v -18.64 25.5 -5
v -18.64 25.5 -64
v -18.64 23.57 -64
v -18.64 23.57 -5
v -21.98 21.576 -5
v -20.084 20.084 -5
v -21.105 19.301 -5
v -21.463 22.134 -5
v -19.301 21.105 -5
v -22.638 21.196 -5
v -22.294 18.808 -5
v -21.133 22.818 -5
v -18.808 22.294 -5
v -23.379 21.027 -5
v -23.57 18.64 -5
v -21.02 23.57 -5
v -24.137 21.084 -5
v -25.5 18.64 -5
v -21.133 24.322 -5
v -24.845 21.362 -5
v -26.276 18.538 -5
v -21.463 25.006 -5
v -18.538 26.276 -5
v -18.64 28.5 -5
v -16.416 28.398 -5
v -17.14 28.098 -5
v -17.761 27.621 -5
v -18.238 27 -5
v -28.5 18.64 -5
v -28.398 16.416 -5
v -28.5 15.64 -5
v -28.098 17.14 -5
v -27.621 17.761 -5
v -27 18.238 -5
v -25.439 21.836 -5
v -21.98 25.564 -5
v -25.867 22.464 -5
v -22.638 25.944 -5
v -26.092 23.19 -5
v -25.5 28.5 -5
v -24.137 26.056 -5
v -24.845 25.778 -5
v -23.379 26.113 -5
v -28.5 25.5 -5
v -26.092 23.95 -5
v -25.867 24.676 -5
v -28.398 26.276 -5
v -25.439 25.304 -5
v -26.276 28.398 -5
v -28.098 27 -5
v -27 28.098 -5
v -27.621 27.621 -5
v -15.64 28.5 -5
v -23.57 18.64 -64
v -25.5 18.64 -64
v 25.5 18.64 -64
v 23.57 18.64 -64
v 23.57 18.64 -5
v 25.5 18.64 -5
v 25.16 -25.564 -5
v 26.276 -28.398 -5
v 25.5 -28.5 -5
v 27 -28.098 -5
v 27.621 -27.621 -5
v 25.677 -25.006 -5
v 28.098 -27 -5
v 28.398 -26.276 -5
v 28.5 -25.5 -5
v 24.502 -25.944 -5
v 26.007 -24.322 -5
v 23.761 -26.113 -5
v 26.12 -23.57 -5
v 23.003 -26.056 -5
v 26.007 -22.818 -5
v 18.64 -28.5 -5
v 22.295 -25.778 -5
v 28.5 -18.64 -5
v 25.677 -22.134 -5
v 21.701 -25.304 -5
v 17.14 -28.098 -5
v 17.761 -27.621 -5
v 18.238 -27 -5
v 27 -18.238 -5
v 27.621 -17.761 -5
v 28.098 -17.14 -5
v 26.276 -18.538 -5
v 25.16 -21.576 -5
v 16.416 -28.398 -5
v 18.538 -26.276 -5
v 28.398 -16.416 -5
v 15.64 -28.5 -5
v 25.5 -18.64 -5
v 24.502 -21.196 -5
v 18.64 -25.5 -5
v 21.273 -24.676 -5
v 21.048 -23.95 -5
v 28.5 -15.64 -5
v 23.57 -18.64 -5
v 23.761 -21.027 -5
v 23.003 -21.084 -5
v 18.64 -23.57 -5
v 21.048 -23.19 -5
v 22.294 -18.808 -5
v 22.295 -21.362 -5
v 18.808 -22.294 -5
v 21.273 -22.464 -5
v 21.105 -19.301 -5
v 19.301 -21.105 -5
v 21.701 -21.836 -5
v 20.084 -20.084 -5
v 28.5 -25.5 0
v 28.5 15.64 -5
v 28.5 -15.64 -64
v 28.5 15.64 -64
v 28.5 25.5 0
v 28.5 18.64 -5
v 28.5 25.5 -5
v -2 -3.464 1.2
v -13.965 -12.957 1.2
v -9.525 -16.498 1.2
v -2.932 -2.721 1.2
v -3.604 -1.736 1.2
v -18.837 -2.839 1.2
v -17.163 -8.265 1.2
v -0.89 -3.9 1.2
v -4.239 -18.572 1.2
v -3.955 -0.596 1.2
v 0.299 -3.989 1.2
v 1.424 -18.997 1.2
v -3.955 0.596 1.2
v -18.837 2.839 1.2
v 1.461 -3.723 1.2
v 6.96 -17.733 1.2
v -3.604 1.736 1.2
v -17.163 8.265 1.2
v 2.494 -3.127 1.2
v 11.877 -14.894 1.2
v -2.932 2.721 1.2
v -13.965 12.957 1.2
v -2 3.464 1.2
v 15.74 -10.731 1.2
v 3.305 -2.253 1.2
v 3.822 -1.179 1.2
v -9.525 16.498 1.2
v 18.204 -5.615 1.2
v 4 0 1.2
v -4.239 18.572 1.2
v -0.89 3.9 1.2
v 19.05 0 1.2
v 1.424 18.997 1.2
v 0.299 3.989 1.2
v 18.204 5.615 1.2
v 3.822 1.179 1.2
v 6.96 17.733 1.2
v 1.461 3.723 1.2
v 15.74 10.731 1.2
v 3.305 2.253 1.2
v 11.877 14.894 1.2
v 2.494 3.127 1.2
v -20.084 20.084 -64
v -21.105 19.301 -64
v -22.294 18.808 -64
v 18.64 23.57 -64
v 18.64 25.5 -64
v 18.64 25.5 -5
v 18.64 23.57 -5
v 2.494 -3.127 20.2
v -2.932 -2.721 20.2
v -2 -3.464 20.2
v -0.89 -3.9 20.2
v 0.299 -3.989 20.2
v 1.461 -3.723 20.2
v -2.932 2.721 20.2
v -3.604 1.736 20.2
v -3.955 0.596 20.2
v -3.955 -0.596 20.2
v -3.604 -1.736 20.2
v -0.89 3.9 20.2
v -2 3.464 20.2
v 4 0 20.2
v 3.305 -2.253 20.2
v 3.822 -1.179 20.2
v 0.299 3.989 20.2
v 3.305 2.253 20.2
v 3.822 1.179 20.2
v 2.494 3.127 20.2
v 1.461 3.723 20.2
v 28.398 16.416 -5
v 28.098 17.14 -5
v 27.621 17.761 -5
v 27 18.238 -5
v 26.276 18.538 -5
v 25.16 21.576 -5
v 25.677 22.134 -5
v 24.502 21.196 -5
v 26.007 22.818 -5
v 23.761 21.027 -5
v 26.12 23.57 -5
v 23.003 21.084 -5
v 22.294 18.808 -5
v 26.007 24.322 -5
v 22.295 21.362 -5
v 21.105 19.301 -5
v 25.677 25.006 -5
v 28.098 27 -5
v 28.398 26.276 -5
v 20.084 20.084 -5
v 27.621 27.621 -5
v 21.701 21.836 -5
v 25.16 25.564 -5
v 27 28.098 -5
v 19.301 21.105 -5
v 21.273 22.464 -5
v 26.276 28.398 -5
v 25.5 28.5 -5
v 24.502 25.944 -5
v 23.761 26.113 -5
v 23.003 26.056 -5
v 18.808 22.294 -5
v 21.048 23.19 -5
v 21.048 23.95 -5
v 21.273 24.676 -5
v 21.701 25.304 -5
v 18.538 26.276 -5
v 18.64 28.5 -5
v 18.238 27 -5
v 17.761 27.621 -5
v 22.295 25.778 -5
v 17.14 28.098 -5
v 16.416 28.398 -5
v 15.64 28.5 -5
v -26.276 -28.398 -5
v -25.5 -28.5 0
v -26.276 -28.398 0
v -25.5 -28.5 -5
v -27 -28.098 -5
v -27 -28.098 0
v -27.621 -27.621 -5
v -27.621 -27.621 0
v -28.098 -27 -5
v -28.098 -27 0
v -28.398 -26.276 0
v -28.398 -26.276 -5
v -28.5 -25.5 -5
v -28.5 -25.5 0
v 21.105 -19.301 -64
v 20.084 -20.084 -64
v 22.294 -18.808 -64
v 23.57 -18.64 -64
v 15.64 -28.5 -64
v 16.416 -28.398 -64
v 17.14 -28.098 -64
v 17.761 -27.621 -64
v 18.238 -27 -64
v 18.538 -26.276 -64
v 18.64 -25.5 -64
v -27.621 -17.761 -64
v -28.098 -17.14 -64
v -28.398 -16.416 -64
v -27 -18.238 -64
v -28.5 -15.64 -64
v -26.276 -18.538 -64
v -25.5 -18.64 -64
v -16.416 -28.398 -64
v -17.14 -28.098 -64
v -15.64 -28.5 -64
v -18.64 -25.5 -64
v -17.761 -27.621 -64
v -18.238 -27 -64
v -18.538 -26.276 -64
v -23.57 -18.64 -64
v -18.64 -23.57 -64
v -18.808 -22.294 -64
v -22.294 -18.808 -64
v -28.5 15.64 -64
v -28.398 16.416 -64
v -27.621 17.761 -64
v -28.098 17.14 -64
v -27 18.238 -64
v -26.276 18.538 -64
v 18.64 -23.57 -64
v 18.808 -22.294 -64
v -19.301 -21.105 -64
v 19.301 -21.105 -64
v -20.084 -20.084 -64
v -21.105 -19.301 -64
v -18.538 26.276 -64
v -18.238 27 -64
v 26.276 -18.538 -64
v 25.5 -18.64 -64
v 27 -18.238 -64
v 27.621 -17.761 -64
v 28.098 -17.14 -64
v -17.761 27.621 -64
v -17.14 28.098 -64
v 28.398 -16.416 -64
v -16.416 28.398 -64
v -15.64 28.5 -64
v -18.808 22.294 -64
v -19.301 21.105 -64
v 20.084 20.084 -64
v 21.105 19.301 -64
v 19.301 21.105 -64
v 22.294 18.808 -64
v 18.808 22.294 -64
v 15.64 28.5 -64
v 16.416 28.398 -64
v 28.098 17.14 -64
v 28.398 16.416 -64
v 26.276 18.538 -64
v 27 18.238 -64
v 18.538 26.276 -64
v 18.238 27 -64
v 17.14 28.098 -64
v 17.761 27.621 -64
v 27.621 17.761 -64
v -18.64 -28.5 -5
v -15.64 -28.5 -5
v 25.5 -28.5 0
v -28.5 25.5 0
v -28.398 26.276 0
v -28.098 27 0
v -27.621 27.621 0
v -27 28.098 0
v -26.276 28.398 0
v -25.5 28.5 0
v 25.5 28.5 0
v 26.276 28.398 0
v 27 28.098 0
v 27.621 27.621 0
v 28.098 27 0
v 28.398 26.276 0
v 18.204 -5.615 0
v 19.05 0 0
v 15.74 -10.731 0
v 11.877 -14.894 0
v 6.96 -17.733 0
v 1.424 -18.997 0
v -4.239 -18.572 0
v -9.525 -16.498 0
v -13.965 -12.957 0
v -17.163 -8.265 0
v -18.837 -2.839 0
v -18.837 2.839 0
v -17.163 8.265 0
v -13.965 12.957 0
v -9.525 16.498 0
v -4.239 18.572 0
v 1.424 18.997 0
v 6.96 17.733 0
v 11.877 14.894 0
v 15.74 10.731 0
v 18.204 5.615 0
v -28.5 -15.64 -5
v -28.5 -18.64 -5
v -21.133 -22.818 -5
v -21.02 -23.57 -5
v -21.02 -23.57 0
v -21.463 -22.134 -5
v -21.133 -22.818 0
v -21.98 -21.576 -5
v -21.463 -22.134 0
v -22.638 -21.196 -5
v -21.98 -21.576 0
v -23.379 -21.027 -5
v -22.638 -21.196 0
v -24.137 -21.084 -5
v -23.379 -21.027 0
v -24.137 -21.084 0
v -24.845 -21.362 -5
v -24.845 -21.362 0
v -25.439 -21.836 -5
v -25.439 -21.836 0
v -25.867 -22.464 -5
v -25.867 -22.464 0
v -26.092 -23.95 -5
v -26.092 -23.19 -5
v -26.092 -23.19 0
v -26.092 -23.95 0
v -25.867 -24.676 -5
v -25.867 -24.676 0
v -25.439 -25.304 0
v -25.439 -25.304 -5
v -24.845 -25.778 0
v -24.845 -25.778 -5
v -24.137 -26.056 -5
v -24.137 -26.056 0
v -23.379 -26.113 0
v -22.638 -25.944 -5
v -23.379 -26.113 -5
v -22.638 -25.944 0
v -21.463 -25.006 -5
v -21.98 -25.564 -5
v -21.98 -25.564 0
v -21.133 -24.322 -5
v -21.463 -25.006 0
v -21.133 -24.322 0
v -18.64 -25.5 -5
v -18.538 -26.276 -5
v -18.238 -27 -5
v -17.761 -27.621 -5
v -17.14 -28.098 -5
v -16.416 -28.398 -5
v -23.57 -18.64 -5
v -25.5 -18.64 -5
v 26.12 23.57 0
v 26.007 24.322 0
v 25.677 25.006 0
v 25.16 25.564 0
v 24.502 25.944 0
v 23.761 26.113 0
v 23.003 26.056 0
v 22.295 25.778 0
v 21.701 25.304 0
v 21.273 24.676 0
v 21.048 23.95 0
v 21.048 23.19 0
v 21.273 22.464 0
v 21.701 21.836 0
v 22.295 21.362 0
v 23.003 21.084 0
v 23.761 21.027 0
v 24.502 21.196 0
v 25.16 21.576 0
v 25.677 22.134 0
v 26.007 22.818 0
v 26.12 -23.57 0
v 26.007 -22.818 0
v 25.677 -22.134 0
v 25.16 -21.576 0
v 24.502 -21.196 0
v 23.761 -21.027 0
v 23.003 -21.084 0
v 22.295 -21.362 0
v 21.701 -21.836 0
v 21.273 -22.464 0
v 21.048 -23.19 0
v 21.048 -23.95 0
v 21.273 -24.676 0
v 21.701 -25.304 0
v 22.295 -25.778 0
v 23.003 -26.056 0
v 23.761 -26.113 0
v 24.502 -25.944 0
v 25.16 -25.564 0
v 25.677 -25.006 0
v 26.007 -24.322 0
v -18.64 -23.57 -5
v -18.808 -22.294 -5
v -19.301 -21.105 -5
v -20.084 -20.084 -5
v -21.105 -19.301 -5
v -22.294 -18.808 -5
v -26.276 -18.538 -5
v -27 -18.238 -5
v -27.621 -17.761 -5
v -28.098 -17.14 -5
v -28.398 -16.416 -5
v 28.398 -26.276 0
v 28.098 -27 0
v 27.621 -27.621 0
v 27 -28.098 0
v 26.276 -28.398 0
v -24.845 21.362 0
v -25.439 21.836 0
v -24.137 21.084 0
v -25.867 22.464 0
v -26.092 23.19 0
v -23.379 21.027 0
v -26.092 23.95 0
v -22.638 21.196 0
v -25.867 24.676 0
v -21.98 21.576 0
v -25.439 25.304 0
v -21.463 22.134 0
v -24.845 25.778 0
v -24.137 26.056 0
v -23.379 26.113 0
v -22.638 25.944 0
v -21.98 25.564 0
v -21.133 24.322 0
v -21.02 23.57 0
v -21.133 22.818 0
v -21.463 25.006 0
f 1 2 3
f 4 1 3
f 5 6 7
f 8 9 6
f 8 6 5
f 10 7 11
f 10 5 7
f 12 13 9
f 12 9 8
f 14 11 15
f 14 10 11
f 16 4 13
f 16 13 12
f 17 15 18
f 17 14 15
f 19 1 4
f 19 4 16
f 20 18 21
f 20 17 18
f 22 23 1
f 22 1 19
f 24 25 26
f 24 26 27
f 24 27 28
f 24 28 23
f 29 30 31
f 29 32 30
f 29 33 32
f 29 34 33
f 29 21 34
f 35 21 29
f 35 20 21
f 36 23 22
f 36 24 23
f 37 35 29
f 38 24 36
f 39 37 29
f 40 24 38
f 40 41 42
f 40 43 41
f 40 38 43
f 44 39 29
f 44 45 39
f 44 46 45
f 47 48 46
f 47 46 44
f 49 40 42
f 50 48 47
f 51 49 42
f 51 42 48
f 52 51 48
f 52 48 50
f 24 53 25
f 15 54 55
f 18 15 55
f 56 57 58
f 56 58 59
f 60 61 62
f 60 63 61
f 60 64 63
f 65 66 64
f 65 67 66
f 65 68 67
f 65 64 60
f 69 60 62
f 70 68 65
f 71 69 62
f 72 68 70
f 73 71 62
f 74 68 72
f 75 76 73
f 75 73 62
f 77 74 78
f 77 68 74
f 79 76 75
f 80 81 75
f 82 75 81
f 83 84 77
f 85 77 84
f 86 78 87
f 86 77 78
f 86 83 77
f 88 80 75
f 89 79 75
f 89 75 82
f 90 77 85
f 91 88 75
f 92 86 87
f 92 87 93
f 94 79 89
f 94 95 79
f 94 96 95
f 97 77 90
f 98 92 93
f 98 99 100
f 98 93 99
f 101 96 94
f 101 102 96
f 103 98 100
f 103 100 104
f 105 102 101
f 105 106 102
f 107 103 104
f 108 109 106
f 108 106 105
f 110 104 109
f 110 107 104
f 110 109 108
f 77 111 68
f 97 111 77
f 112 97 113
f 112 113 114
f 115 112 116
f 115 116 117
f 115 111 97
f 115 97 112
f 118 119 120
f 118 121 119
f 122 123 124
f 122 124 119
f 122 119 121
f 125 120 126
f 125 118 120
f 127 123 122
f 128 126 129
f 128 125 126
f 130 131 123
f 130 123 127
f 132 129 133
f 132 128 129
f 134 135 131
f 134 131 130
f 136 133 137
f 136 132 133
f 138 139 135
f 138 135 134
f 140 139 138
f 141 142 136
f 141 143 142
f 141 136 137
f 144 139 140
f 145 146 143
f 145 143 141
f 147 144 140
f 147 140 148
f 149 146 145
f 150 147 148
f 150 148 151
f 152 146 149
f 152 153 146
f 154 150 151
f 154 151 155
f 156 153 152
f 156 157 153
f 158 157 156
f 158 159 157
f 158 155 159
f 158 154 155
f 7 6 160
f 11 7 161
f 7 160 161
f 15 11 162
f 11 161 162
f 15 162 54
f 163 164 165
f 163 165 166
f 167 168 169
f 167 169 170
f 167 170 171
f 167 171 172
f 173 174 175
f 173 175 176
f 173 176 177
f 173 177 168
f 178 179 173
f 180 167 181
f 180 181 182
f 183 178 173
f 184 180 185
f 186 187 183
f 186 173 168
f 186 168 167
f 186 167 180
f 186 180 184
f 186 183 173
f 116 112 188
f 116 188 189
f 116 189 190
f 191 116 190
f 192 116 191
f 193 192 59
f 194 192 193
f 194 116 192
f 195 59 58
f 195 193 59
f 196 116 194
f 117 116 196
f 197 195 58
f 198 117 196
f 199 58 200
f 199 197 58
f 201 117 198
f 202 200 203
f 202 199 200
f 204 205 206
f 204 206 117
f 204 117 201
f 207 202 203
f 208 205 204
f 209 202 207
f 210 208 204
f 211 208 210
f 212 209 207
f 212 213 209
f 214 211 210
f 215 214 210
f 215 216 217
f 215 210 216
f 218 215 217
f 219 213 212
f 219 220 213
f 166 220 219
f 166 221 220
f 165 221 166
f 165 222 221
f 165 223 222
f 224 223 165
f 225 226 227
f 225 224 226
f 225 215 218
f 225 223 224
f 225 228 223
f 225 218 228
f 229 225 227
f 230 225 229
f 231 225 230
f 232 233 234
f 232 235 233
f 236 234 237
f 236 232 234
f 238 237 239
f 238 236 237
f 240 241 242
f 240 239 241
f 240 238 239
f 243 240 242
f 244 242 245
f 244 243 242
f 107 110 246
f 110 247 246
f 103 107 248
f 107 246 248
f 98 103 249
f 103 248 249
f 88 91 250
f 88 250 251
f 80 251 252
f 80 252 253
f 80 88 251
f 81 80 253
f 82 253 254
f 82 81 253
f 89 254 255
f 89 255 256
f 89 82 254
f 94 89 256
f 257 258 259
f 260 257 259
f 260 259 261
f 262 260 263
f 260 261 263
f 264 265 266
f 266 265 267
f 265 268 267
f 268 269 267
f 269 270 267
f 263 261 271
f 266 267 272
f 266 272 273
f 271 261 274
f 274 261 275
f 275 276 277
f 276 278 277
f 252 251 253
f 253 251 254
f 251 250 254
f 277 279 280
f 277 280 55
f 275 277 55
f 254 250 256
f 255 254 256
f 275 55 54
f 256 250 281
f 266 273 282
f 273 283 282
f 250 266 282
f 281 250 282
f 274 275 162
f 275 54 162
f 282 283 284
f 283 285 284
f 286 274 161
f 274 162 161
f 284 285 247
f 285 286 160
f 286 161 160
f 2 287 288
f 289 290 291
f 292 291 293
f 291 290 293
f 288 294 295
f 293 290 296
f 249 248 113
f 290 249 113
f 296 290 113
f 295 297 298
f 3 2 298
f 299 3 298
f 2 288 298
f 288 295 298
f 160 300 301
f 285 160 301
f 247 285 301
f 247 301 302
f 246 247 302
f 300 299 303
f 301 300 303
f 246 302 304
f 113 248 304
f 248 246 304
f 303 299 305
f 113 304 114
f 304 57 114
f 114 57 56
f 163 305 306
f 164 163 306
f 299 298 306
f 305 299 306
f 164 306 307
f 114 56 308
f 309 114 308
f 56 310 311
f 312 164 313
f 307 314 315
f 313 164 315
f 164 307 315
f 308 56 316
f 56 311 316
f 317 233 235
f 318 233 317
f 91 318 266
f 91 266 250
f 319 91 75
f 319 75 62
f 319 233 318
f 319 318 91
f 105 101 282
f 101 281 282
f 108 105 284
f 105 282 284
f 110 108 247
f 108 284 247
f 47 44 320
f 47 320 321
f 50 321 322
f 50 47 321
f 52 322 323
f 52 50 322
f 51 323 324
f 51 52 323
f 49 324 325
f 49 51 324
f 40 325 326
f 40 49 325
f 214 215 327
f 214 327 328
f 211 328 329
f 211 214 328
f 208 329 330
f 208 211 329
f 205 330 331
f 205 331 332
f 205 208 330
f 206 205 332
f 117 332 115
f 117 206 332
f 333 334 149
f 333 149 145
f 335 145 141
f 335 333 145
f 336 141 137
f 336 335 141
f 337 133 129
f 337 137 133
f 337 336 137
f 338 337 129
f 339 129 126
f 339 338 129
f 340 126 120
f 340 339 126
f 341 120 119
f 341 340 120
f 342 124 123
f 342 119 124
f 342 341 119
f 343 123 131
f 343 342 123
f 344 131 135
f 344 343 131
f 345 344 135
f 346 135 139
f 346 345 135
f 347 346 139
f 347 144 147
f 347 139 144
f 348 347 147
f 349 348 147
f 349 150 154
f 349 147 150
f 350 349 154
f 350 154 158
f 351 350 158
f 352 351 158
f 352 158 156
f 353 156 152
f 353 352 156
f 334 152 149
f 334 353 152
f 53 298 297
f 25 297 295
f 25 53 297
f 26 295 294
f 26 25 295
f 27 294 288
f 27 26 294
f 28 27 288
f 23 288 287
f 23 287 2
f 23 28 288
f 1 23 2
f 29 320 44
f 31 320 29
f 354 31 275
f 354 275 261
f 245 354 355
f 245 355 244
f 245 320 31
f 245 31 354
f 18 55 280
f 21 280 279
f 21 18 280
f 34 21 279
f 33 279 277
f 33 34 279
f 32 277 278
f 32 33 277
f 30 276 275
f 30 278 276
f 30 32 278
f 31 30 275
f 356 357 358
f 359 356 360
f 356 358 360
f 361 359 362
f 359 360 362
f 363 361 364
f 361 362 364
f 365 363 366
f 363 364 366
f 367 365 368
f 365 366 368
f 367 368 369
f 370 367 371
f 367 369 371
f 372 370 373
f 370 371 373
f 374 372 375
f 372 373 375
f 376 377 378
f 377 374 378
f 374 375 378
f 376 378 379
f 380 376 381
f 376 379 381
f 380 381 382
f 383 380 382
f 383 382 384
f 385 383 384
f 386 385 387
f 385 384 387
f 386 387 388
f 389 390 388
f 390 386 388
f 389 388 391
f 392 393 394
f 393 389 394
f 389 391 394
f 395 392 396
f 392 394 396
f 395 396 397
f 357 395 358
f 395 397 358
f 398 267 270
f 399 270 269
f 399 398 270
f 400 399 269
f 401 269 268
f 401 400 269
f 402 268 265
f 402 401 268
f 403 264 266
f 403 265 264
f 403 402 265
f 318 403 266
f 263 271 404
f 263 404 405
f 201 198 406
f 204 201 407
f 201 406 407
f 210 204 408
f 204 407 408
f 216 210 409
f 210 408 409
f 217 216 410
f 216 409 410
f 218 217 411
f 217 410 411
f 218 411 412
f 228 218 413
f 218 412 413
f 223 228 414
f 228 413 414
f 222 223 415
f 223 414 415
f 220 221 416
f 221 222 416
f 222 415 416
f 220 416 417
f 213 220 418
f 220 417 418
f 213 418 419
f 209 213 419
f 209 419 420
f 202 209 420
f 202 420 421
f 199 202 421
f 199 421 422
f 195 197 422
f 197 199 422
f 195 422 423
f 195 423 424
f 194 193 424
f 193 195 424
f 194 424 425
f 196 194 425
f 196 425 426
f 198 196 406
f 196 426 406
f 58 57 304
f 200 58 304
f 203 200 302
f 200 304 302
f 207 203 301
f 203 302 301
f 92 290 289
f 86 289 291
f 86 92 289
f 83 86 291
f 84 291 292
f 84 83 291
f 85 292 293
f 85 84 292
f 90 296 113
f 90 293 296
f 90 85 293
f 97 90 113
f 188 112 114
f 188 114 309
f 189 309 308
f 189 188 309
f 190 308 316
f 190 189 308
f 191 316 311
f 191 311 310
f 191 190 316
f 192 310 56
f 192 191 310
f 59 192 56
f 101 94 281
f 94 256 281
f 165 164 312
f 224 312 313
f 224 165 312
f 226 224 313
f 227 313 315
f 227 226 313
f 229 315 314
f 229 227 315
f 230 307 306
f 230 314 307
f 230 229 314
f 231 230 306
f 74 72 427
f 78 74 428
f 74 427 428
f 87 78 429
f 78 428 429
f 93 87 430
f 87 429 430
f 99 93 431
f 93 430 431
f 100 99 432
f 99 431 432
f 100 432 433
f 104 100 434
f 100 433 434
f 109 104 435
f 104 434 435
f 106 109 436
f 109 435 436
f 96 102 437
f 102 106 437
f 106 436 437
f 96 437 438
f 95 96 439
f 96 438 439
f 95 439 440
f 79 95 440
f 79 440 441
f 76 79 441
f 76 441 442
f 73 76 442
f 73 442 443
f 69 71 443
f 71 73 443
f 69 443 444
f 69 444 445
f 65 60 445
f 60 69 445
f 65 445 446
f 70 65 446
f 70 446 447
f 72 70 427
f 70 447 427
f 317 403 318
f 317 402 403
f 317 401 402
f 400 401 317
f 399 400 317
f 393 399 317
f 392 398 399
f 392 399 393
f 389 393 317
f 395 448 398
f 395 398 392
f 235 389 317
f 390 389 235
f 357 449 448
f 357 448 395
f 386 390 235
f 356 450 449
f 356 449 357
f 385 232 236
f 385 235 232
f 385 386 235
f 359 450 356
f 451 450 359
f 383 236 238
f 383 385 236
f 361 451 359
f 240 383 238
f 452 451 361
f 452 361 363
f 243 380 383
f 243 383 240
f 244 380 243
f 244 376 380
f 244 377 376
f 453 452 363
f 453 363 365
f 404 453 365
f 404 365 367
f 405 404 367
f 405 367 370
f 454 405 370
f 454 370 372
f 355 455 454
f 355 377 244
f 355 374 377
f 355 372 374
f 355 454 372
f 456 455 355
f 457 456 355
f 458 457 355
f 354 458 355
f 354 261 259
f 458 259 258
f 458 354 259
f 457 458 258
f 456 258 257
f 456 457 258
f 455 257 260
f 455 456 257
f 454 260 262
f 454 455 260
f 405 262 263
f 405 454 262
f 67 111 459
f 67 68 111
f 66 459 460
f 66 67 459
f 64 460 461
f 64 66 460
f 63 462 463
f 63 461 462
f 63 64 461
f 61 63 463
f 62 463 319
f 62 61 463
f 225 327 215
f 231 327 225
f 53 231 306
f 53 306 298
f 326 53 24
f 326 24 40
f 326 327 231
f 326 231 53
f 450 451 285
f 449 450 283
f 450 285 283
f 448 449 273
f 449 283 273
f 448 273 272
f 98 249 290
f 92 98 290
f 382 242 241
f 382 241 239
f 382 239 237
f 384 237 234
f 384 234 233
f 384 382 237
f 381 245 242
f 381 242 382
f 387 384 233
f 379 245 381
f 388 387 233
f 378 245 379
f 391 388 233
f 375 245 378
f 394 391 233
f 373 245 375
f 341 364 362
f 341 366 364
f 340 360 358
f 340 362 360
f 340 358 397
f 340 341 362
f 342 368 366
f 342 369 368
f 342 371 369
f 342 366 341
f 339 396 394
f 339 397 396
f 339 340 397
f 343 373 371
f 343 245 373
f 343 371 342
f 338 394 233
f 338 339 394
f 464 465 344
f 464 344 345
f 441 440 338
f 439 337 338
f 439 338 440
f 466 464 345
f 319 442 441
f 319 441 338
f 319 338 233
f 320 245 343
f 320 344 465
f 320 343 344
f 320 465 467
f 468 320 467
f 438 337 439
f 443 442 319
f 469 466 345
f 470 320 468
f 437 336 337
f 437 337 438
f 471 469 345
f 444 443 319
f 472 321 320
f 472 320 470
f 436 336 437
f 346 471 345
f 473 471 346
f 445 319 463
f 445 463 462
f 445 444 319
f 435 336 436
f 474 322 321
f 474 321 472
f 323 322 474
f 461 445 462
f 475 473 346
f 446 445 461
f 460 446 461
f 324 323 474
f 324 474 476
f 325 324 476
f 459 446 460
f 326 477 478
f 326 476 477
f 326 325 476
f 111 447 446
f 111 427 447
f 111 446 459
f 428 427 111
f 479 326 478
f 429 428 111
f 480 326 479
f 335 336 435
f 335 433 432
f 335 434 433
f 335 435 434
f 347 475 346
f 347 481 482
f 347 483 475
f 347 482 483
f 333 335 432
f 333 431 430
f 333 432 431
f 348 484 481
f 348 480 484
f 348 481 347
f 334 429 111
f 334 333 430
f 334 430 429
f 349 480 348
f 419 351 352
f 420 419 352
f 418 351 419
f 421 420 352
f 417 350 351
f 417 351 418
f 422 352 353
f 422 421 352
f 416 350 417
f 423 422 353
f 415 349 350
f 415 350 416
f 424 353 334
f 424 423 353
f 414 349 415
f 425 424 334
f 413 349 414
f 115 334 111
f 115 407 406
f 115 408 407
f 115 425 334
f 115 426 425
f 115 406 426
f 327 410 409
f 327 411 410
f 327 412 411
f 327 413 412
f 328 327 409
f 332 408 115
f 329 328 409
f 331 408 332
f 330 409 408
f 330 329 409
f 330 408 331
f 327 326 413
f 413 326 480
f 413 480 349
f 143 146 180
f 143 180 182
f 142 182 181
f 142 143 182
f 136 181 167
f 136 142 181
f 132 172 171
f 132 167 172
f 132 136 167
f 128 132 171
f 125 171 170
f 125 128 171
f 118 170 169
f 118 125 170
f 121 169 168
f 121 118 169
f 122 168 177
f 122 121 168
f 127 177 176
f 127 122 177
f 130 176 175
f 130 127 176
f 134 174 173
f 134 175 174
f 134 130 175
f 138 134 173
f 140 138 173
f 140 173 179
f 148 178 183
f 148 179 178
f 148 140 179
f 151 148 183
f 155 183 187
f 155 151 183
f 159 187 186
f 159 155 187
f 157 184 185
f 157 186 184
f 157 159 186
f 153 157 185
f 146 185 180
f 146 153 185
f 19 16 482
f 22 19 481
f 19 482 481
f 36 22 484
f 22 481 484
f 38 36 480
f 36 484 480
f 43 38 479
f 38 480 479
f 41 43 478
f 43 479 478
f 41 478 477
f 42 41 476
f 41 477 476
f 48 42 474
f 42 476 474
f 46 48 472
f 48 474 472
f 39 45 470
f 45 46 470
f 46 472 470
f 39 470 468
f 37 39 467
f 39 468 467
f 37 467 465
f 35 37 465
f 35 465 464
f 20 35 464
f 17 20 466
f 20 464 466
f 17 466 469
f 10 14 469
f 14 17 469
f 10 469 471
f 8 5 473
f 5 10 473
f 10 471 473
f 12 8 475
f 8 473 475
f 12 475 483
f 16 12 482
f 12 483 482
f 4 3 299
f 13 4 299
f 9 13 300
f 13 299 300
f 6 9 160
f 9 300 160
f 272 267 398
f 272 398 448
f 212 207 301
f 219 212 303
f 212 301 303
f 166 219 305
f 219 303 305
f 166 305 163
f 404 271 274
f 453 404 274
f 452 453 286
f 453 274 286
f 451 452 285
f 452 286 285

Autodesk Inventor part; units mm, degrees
ref_plane "YZ Plane" through (0, 0, 0) normal (1, 0, 0) x (0, 1, 0)
ref_plane "XZ Plane" through (0, 0, 0) normal (0, 1, 0) x (-1, 0, 0)
ref_plane "XY Plane" through (0, 0, 0) normal (0, 0, 1) x (1, 0, 0)
sketch "Sketch1" plane through (0, 0, 0) normal (0, 0, 1) x (1, 0, 0)
  line L0 (-28.5, -28.5) -> (28.5, -28.5)
  line L1 (28.5, -28.5) -> (28.5, 28.5)
  line L2 (28.5, 28.5) -> (-28.5, 28.5)
  line L3 (-28.5, 28.5) -> (-28.5, -28.5)
  line L4 (-28.5, -28.5) -> (28.5, 28.5) construction
  line L5 (28.5, -28.5) -> (-28.5, 28.5) construction
  circle A0 centre (23.57, 23.57) radius 2.55
  line L6 (0, 28.5) -> (0, -28.5) construction
  line L7 (28.5, 0) -> (-28.5, 0) construction
  circle A1 centre (-23.57, 23.57) radius 2.55
  circle A2 centre (23.57, -23.57) radius 2.55
  circle A3 centre (-23.57, -23.57) radius 2.55
  circle A4 centre (0, 0) radius 19.05
  circle A5 centre (0, 0) radius 4
  dimension "d0" = 57
  dimension "d1" = 57
  dimension "d2" = 5.1
  dimension "d3" = 47.14
  dimension "d4" = 38.1
  dimension "d5" = 8
extrude "Extrusion1" add sketch "Sketch1" against normal blind 64 contours L3 L2 L1 L0 | A4 | A5
extrude "Extrusion2" add sketch "Sketch1" along normal blind 1.2 contours A4
extrude "Extrusion3" add sketch "Sketch1" along normal blind 20.2 contours A5
sketch "Sketch2" plane through (0, 0, -64) normal (0, 0, -1) x (-1, 0, 0)
  circle A0 centre (-23.57, -23.57) radius 2.55 projected
  circle A1 centre (23.57, -23.57) radius 2.55 projected
  circle A2 centre (23.57, 23.57) radius 2.55 projected
  circle A3 centre (-23.57, 23.57) radius 2.55 projected
  line L0 (-28.5, -28.5) -> (28.5, -28.5) projected
  line L1 (28.5, -28.5) -> (28.5, 28.5) projected
  line L2 (28.5, 28.5) -> (-28.5, 28.5) projected
  line L3 (-28.5, 28.5) -> (-28.5, -28.5) projected
  line L4 (-28.5, -28.5) -> (-28.5, 28.5) projected
  line L5 (28.5, 28.5) -> (28.5, -28.5) projected
  line L6 (-18.64, -18.64) -> (-23.57, -18.64) construction
  line L7 (-28.5, -18.64) -> (-28.5, -28.5)
  line L8 (-28.5, -28.5) -> (-18.64, -28.5)
  line L9 (-18.64, -28.5) -> (-18.64, -23.57)
  line L10 (-18.64, -18.64) -> (-28.5, -28.5) construction
  line L11 (-28.5, -18.64) -> (-18.64, -28.5) construction
  line L12 (-28.5, 28.5) -> (28.5, 28.5) projected
  circle A4 centre (-23.57, -23.57) radius 2.55 projected
  arc A5 (-27.056, -20.084) -> (-28.5, -23.57) centre (-23.57, -23.57) ccw construction
  line L13 (-18.64, -23.57) -> (-18.64, -18.64) construction
  line L14 (-23.57, -18.64) -> (-28.5, -18.64)
  arc A6 (-23.57, -18.64) -> (-27.056, -20.084) centre (-23.57, -23.57) ccw construction
  arc A7 (-27.056, -27.056) -> (-20.084, -27.056) centre (-23.57, -23.57) ccw construction
  arc A8 (-20.084, -27.056) -> (-18.64, -23.57) centre (-23.57, -23.57) ccw construction
  arc A9 (-20.084, -20.084) -> (-23.57, -18.64) centre (-23.57, -23.57) ccw
  arc A10 (-18.64, -23.57) -> (-20.084, -20.084) centre (-23.57, -23.57) ccw
  arc A11 (-28.5, -23.57) -> (-27.056, -27.056) centre (-23.57, -23.57) ccw construction
  line L15 (0, 28.5) -> (0, -28.5) construction
  line L16 (-28.5, -28.5) -> (28.5, -28.5) construction
  line L17 (28.5, 0) -> (-28.5, 0) construction
  circle A12 centre (23.57, -23.57) radius 2.55
  line L18 (18.64, -18.64) -> (23.57, -18.64) construction
  line L19 (28.5, -18.64) -> (28.5, -28.5)
  line L20 (28.5, -28.5) -> (18.64, -28.5)
  line L21 (18.64, -28.5) -> (18.64, -23.57)
  line L22 (18.64, -18.64) -> (28.5, -28.5) construction
  line L23 (28.5, -18.64) -> (18.64, -28.5) construction
  circle A13 centre (23.57, -23.57) radius 2.55
  arc A14 (28.5, -23.57) -> (27.056, -20.084) centre (23.57, -23.57) ccw construction
  line L24 (18.64, -23.57) -> (18.64, -18.64) construction
  line L25 (23.57, -18.64) -> (28.5, -18.64)
  arc A15 (27.056, -20.084) -> (23.57, -18.64) centre (23.57, -23.57) ccw construction
  arc A16 (20.084, -27.056) -> (27.056, -27.056) centre (23.57, -23.57) ccw construction
  arc A17 (18.64, -23.57) -> (20.084, -27.056) centre (23.57, -23.57) ccw construction
  arc A18 (23.57, -18.64) -> (20.084, -20.084) centre (23.57, -23.57) ccw
  arc A19 (20.084, -20.084) -> (18.64, -23.57) centre (23.57, -23.57) ccw
  arc A20 (27.056, -27.056) -> (28.5, -23.57) centre (23.57, -23.57) ccw construction
  circle A21 centre (-23.57, 23.57) radius 2.55
  circle A22 centre (23.57, 23.57) radius 2.55
  line L26 (-18.64, 18.64) -> (-23.57, 18.64) construction
  line L27 (-28.5, 18.64) -> (-28.5, 28.5)
  line L28 (-28.5, 28.5) -> (-18.64, 28.5)
  line L29 (-18.64, 28.5) -> (-18.64, 23.57)
  line L30 (-18.64, 18.64) -> (-28.5, 28.5) construction
  line L31 (-28.5, 18.64) -> (-18.64, 28.5) construction
  circle A23 centre (-23.57, 23.57) radius 2.55
  arc A24 (-28.5, 23.57) -> (-27.056, 20.084) centre (-23.57, 23.57) ccw construction
  line L32 (-18.64, 23.57) -> (-18.64, 18.64) construction
  line L33 (-23.57, 18.64) -> (-28.5, 18.64)
  arc A25 (-27.056, 20.084) -> (-23.57, 18.64) centre (-23.57, 23.57) ccw construction
  arc A26 (-20.084, 27.056) -> (-27.056, 27.056) centre (-23.57, 23.57) ccw construction
  arc A27 (-18.64, 23.57) -> (-20.084, 27.056) centre (-23.57, 23.57) ccw construction
  arc A28 (-23.57, 18.64) -> (-20.084, 20.084) centre (-23.57, 23.57) ccw
  arc A29 (-20.084, 20.084) -> (-18.64, 23.57) centre (-23.57, 23.57) ccw
  arc A30 (-27.056, 27.056) -> (-28.5, 23.57) centre (-23.57, 23.57) ccw construction
  line L34 (-28.5, 28.5) -> (28.5, 28.5) construction
  circle A31 centre (23.57, 23.57) radius 2.55
  line L35 (18.64, 23.57) -> (18.64, 18.64) construction
  arc A32 (18.64, 23.57) -> (20.084, 20.084) centre (23.57, 23.57) ccw
  line L36 (18.64, 28.5) -> (18.64, 23.57)
  line L37 (18.64, 18.64) -> (23.57, 18.64) construction
  arc A33 (20.084, 27.056) -> (18.64, 23.57) centre (23.57, 23.57) ccw construction
  arc A34 (20.084, 20.084) -> (23.57, 18.64) centre (23.57, 23.57) ccw
  arc A35 (23.57, 18.64) -> (27.056, 20.084) centre (23.57, 23.57) ccw construction
  line L38 (23.57, 18.64) -> (28.5, 18.64)
  arc A36 (27.056, 20.084) -> (28.5, 23.57) centre (23.57, 23.57) ccw construction
  arc A37 (27.056, 27.056) -> (20.084, 27.056) centre (23.57, 23.57) ccw construction
  arc A38 (28.5, 23.57) -> (27.056, 27.056) centre (23.57, 23.57) ccw construction
  line L39 (28.5, 18.64) -> (28.5, 28.5)
  line L40 (18.64, 18.64) -> (28.5, 28.5) construction
  line L41 (28.5, 18.64) -> (18.64, 28.5) construction
  line L42 (28.5, 28.5) -> (18.64, 28.5)
  circle A39 centre (23.57, 23.57) radius 2.55
  point P0 (0, 0)
extrude "Extrusion4" cut sketch "Sketch2" against normal blind 59 contours L3 L14 A9 A10 L9 L0 | L21 A19 A18 L25 L1 L0 | L3 L2 L29 A29 A28 L33 | L38 A34 A32 L36 L2 L1
fillet "Fillet1" radius 3 12 edges at (28.5, 28.5, -2.5) (-28.5, 28.5, -2.5) (-28.5, -28.5, -2.5) (28.5, -28.5, -2.5) (-18.64, -28.5, -34.5) (-28.5, -18.64, -34.5) (18.64, -28.5, -34.5) (28.5, -18.64, -34.5) (28.5, 18.64, -34.5) (18.64, 28.5, -34.5) (-18.64, 28.5, -34.5) (-28.5, 18.64, -34.5)
properties part number "nema23-wotiom"
